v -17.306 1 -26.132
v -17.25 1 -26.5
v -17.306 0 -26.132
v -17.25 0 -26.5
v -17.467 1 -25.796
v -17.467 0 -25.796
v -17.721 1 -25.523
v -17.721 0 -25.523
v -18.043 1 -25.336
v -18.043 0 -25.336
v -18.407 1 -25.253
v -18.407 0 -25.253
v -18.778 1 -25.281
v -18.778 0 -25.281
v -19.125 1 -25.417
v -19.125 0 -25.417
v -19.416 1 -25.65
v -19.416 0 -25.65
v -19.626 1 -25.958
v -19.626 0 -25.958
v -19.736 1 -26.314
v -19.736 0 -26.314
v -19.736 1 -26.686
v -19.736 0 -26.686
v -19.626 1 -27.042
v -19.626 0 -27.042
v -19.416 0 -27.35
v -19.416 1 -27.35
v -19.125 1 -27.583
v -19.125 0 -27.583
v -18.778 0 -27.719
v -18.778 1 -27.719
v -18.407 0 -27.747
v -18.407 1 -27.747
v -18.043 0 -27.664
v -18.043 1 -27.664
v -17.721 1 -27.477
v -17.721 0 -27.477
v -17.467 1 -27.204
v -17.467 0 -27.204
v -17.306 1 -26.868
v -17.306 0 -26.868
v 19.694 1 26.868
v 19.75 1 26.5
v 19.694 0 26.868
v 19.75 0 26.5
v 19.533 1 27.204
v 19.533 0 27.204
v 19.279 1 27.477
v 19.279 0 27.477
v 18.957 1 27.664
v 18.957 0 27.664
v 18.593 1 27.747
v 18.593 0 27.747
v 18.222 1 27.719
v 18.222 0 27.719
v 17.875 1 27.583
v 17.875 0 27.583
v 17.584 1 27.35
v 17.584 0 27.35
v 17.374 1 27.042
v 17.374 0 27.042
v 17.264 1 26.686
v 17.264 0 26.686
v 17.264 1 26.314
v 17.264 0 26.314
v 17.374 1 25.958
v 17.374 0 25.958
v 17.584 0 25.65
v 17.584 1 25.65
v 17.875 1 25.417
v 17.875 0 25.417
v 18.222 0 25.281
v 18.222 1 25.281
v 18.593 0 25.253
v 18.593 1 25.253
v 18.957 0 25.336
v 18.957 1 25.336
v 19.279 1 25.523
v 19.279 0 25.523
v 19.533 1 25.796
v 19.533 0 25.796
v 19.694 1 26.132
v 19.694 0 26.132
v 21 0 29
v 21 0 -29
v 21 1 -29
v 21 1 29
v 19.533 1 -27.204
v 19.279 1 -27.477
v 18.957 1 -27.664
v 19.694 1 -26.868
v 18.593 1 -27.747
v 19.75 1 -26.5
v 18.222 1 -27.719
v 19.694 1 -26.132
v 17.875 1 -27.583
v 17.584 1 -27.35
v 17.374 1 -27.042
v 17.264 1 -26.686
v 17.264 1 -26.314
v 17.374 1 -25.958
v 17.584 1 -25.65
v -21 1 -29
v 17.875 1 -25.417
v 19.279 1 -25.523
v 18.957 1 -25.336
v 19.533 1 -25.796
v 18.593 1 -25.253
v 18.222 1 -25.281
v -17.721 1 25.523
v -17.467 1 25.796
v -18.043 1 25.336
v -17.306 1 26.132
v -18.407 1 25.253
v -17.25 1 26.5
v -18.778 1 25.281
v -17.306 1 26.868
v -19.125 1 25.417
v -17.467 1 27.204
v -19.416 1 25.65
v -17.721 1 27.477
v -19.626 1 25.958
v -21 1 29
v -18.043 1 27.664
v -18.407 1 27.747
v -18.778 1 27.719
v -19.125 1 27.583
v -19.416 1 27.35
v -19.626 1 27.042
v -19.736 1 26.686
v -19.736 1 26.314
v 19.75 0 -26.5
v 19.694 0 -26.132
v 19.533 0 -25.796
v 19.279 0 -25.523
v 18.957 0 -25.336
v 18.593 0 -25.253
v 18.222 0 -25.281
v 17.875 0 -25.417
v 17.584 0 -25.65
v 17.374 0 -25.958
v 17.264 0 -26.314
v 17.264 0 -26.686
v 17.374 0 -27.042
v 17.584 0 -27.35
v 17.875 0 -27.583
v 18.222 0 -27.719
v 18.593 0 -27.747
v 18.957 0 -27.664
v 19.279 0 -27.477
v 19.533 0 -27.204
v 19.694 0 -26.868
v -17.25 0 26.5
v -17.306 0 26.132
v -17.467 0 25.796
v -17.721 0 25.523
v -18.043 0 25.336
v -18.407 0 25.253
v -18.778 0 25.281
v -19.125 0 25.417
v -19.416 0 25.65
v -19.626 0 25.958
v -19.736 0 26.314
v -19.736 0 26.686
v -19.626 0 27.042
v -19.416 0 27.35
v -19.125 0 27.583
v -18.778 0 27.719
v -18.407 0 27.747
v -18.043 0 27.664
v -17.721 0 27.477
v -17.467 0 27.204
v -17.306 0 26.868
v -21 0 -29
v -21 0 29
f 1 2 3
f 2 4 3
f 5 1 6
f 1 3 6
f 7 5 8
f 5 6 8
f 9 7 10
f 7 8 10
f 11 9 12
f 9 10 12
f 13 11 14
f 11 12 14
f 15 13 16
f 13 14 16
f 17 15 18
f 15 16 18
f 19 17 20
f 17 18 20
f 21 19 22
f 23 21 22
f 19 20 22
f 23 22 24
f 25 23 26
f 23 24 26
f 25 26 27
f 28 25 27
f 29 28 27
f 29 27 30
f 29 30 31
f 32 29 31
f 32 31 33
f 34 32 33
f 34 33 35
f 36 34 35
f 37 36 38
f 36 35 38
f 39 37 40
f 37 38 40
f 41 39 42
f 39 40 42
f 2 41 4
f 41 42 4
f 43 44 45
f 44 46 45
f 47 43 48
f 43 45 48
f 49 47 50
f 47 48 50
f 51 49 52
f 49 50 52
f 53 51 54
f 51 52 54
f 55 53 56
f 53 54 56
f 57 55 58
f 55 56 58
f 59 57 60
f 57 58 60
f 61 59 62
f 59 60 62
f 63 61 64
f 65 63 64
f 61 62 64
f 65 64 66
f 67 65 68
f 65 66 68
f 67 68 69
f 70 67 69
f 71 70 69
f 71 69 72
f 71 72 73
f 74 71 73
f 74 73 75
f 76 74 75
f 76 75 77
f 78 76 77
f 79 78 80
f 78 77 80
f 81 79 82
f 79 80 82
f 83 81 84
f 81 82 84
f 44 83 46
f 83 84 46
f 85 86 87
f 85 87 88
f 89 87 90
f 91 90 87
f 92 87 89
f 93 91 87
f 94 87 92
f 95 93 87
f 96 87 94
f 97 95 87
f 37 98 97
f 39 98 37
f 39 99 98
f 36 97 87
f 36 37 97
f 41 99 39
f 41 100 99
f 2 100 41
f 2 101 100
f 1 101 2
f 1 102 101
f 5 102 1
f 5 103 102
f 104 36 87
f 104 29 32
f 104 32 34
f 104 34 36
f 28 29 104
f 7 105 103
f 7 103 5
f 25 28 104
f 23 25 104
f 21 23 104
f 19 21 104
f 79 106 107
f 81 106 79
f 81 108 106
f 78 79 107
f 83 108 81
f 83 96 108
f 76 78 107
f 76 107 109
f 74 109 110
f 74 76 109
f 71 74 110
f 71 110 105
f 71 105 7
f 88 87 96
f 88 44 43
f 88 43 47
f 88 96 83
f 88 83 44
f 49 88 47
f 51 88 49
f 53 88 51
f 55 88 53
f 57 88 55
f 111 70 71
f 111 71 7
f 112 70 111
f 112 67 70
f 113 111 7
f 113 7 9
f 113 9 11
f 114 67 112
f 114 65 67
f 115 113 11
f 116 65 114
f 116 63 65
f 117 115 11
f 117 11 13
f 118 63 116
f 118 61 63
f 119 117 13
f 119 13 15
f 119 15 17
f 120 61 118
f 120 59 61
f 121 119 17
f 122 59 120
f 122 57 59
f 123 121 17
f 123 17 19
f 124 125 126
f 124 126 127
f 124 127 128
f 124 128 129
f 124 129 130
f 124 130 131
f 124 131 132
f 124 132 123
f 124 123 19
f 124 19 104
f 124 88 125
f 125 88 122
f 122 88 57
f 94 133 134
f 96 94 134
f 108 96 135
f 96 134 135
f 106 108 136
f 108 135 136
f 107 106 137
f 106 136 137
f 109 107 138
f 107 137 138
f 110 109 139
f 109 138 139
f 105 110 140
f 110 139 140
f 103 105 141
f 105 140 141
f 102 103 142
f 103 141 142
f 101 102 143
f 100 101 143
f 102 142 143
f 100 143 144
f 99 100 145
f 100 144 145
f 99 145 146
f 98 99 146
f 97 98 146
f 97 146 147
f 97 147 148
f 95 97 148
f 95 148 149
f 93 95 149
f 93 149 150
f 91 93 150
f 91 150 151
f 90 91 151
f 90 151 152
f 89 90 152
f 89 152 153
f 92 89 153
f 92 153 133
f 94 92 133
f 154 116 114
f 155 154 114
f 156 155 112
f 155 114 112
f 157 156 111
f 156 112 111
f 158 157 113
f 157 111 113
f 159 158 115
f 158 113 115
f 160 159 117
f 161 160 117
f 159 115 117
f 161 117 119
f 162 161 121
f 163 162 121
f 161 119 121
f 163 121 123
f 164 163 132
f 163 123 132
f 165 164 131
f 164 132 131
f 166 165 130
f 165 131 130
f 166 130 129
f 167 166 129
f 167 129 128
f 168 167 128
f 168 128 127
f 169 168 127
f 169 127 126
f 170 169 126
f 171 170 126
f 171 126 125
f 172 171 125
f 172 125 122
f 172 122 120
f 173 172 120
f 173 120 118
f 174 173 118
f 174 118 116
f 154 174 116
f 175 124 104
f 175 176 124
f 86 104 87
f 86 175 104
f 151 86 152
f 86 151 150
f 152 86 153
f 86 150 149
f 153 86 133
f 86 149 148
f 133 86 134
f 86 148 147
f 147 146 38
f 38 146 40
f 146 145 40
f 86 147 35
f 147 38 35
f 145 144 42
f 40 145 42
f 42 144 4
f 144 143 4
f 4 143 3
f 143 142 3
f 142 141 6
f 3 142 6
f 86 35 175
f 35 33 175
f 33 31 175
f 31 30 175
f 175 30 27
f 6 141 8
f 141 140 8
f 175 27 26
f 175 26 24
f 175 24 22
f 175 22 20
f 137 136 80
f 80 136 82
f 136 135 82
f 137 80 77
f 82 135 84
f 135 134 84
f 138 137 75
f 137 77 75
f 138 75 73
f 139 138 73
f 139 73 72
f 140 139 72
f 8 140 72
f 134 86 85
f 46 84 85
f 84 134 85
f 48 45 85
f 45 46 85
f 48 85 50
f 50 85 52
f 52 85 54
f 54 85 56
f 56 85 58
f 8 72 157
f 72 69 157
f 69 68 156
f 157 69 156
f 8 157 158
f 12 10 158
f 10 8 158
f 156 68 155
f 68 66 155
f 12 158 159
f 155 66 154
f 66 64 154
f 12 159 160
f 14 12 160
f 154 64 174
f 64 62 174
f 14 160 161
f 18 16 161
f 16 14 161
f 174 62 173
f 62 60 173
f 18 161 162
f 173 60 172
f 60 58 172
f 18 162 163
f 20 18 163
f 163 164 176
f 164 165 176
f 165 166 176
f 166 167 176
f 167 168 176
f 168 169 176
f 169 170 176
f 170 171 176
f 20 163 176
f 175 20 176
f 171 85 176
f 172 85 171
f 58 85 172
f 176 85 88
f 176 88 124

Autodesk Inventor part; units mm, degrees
ref_plane "YZ Plane" through (0, 0, 0) normal (1, 0, 0) x (0, 1, 0)
ref_plane "XZ Plane" through (0, 0, 0) normal (0, 1, 0) x (-1, 0, 0)
ref_plane "XY Plane" through (0, 0, 0) normal (0, 0, 1) x (1, 0, 0)
sketch "Sketch1" plane through (0, 0, 0) normal (0, 1, 0) x (-1, 0, 0)
  line L0 (-21, 29) -> (21, 29)
  line L1 (21, 29) -> (21, -29)
  line L2 (21, -29) -> (-21, -29)
  line L3 (-21, -29) -> (-21, 29)
  line L4 (-21, 29) -> (21, -29) construction
  line L5 (21, 29) -> (-21, -29) construction
  point P0 (0, 0)
  dimension "d0" = 42
  dimension "d1" = 58
extrude "Extrusion1" add sketch "Sketch1" along normal blind 1
sketch "Sketch4" plane through (0, 0, 0) normal (0, -1, 0) x (1, 0, 0)
  line L0 (-21, 29) -> (21, 29) projected
  line L1 (21, 29) -> (18.5, 29)
  line L2 (18.5, 29) -> (18.5, 26.5)
  line L3 (18.5, 26.5) -> (21, 26.5)
  line L4 (21, 26.5) -> (21, 29)
  circle A0 centre (18.5, 26.5) radius 1.25
  point P0 (0, 0)
  dimension "d42" = 2.5
  dimension "d43" = 2.5
  dimension "d44" = 2.5
extrude "Extrusion2" cut sketch "Sketch4" against normal through all contours A0 L3 L2 | L2 L3 A0
sketch "Sketch5" plane through (0, 0, 0) normal (0, -1, 0) x (1, 0, 0)
  line L0 (-21, -29) -> (21, -29) projected
  line L1 (-21, -29) -> (-18.5, -29)
  line L2 (-18.5, -29) -> (-18.5, -26.5)
  line L3 (-18.5, -26.5) -> (-21, -26.5)
  line L4 (-21, -26.5) -> (-21, -29)
  circle A0 centre (-18.5, -26.5) radius 1.25
  point P0 (0, 0)
  dimension "d49" = 2.5
  dimension "d50" = 2.5
  dimension "d51" = 2.5
extrude "Extrusion3" cut sketch "Sketch5" against normal through all contours A0 L3 L2 | L2 L3 A0
sketch "Sketch6" plane through (0, 1, 0) normal (0, 1, 0) x (1, 0, 0)
  line L0 (-21, -29) -> (21, -29) projected
  line L1 (-21, -29) -> (-18.5, -29)
  line L2 (-18.5, -29) -> (-18.5, -26.5)
  line L3 (-18.5, -26.5) -> (-21, -26.5)
  line L4 (-21, -26.5) -> (-21, -29)
  circle A0 centre (-18.5, -26.5) radius 1.25
  point P0 (0, 0)
  dimension "d60" = 2.5
  dimension "d61" = 2.5
  dimension "d62" = 2.5
extrude "Extrusion4" cut sketch "Sketch6" against normal up to next contours A0 L3 L2 | L2 L3 A0
sketch "Sketch7" plane through (0, 0, 0) normal (0, -1, 0) x (1, 0, 0)
  circle A0 centre (18.5, -26.5) radius 1.25
  line L0 (-21, -29) -> (21, -29) projected
  line L1 (21, -29) -> (21, 29) projected
  point P0 (0, 0)
  dimension "d67" = 2.5
  dimension "d68" = 2.5
  dimension "d69" = 2.5
extrude "Extrusion5" cut sketch "Sketch7" against normal up to next
properties part number "regulator"
